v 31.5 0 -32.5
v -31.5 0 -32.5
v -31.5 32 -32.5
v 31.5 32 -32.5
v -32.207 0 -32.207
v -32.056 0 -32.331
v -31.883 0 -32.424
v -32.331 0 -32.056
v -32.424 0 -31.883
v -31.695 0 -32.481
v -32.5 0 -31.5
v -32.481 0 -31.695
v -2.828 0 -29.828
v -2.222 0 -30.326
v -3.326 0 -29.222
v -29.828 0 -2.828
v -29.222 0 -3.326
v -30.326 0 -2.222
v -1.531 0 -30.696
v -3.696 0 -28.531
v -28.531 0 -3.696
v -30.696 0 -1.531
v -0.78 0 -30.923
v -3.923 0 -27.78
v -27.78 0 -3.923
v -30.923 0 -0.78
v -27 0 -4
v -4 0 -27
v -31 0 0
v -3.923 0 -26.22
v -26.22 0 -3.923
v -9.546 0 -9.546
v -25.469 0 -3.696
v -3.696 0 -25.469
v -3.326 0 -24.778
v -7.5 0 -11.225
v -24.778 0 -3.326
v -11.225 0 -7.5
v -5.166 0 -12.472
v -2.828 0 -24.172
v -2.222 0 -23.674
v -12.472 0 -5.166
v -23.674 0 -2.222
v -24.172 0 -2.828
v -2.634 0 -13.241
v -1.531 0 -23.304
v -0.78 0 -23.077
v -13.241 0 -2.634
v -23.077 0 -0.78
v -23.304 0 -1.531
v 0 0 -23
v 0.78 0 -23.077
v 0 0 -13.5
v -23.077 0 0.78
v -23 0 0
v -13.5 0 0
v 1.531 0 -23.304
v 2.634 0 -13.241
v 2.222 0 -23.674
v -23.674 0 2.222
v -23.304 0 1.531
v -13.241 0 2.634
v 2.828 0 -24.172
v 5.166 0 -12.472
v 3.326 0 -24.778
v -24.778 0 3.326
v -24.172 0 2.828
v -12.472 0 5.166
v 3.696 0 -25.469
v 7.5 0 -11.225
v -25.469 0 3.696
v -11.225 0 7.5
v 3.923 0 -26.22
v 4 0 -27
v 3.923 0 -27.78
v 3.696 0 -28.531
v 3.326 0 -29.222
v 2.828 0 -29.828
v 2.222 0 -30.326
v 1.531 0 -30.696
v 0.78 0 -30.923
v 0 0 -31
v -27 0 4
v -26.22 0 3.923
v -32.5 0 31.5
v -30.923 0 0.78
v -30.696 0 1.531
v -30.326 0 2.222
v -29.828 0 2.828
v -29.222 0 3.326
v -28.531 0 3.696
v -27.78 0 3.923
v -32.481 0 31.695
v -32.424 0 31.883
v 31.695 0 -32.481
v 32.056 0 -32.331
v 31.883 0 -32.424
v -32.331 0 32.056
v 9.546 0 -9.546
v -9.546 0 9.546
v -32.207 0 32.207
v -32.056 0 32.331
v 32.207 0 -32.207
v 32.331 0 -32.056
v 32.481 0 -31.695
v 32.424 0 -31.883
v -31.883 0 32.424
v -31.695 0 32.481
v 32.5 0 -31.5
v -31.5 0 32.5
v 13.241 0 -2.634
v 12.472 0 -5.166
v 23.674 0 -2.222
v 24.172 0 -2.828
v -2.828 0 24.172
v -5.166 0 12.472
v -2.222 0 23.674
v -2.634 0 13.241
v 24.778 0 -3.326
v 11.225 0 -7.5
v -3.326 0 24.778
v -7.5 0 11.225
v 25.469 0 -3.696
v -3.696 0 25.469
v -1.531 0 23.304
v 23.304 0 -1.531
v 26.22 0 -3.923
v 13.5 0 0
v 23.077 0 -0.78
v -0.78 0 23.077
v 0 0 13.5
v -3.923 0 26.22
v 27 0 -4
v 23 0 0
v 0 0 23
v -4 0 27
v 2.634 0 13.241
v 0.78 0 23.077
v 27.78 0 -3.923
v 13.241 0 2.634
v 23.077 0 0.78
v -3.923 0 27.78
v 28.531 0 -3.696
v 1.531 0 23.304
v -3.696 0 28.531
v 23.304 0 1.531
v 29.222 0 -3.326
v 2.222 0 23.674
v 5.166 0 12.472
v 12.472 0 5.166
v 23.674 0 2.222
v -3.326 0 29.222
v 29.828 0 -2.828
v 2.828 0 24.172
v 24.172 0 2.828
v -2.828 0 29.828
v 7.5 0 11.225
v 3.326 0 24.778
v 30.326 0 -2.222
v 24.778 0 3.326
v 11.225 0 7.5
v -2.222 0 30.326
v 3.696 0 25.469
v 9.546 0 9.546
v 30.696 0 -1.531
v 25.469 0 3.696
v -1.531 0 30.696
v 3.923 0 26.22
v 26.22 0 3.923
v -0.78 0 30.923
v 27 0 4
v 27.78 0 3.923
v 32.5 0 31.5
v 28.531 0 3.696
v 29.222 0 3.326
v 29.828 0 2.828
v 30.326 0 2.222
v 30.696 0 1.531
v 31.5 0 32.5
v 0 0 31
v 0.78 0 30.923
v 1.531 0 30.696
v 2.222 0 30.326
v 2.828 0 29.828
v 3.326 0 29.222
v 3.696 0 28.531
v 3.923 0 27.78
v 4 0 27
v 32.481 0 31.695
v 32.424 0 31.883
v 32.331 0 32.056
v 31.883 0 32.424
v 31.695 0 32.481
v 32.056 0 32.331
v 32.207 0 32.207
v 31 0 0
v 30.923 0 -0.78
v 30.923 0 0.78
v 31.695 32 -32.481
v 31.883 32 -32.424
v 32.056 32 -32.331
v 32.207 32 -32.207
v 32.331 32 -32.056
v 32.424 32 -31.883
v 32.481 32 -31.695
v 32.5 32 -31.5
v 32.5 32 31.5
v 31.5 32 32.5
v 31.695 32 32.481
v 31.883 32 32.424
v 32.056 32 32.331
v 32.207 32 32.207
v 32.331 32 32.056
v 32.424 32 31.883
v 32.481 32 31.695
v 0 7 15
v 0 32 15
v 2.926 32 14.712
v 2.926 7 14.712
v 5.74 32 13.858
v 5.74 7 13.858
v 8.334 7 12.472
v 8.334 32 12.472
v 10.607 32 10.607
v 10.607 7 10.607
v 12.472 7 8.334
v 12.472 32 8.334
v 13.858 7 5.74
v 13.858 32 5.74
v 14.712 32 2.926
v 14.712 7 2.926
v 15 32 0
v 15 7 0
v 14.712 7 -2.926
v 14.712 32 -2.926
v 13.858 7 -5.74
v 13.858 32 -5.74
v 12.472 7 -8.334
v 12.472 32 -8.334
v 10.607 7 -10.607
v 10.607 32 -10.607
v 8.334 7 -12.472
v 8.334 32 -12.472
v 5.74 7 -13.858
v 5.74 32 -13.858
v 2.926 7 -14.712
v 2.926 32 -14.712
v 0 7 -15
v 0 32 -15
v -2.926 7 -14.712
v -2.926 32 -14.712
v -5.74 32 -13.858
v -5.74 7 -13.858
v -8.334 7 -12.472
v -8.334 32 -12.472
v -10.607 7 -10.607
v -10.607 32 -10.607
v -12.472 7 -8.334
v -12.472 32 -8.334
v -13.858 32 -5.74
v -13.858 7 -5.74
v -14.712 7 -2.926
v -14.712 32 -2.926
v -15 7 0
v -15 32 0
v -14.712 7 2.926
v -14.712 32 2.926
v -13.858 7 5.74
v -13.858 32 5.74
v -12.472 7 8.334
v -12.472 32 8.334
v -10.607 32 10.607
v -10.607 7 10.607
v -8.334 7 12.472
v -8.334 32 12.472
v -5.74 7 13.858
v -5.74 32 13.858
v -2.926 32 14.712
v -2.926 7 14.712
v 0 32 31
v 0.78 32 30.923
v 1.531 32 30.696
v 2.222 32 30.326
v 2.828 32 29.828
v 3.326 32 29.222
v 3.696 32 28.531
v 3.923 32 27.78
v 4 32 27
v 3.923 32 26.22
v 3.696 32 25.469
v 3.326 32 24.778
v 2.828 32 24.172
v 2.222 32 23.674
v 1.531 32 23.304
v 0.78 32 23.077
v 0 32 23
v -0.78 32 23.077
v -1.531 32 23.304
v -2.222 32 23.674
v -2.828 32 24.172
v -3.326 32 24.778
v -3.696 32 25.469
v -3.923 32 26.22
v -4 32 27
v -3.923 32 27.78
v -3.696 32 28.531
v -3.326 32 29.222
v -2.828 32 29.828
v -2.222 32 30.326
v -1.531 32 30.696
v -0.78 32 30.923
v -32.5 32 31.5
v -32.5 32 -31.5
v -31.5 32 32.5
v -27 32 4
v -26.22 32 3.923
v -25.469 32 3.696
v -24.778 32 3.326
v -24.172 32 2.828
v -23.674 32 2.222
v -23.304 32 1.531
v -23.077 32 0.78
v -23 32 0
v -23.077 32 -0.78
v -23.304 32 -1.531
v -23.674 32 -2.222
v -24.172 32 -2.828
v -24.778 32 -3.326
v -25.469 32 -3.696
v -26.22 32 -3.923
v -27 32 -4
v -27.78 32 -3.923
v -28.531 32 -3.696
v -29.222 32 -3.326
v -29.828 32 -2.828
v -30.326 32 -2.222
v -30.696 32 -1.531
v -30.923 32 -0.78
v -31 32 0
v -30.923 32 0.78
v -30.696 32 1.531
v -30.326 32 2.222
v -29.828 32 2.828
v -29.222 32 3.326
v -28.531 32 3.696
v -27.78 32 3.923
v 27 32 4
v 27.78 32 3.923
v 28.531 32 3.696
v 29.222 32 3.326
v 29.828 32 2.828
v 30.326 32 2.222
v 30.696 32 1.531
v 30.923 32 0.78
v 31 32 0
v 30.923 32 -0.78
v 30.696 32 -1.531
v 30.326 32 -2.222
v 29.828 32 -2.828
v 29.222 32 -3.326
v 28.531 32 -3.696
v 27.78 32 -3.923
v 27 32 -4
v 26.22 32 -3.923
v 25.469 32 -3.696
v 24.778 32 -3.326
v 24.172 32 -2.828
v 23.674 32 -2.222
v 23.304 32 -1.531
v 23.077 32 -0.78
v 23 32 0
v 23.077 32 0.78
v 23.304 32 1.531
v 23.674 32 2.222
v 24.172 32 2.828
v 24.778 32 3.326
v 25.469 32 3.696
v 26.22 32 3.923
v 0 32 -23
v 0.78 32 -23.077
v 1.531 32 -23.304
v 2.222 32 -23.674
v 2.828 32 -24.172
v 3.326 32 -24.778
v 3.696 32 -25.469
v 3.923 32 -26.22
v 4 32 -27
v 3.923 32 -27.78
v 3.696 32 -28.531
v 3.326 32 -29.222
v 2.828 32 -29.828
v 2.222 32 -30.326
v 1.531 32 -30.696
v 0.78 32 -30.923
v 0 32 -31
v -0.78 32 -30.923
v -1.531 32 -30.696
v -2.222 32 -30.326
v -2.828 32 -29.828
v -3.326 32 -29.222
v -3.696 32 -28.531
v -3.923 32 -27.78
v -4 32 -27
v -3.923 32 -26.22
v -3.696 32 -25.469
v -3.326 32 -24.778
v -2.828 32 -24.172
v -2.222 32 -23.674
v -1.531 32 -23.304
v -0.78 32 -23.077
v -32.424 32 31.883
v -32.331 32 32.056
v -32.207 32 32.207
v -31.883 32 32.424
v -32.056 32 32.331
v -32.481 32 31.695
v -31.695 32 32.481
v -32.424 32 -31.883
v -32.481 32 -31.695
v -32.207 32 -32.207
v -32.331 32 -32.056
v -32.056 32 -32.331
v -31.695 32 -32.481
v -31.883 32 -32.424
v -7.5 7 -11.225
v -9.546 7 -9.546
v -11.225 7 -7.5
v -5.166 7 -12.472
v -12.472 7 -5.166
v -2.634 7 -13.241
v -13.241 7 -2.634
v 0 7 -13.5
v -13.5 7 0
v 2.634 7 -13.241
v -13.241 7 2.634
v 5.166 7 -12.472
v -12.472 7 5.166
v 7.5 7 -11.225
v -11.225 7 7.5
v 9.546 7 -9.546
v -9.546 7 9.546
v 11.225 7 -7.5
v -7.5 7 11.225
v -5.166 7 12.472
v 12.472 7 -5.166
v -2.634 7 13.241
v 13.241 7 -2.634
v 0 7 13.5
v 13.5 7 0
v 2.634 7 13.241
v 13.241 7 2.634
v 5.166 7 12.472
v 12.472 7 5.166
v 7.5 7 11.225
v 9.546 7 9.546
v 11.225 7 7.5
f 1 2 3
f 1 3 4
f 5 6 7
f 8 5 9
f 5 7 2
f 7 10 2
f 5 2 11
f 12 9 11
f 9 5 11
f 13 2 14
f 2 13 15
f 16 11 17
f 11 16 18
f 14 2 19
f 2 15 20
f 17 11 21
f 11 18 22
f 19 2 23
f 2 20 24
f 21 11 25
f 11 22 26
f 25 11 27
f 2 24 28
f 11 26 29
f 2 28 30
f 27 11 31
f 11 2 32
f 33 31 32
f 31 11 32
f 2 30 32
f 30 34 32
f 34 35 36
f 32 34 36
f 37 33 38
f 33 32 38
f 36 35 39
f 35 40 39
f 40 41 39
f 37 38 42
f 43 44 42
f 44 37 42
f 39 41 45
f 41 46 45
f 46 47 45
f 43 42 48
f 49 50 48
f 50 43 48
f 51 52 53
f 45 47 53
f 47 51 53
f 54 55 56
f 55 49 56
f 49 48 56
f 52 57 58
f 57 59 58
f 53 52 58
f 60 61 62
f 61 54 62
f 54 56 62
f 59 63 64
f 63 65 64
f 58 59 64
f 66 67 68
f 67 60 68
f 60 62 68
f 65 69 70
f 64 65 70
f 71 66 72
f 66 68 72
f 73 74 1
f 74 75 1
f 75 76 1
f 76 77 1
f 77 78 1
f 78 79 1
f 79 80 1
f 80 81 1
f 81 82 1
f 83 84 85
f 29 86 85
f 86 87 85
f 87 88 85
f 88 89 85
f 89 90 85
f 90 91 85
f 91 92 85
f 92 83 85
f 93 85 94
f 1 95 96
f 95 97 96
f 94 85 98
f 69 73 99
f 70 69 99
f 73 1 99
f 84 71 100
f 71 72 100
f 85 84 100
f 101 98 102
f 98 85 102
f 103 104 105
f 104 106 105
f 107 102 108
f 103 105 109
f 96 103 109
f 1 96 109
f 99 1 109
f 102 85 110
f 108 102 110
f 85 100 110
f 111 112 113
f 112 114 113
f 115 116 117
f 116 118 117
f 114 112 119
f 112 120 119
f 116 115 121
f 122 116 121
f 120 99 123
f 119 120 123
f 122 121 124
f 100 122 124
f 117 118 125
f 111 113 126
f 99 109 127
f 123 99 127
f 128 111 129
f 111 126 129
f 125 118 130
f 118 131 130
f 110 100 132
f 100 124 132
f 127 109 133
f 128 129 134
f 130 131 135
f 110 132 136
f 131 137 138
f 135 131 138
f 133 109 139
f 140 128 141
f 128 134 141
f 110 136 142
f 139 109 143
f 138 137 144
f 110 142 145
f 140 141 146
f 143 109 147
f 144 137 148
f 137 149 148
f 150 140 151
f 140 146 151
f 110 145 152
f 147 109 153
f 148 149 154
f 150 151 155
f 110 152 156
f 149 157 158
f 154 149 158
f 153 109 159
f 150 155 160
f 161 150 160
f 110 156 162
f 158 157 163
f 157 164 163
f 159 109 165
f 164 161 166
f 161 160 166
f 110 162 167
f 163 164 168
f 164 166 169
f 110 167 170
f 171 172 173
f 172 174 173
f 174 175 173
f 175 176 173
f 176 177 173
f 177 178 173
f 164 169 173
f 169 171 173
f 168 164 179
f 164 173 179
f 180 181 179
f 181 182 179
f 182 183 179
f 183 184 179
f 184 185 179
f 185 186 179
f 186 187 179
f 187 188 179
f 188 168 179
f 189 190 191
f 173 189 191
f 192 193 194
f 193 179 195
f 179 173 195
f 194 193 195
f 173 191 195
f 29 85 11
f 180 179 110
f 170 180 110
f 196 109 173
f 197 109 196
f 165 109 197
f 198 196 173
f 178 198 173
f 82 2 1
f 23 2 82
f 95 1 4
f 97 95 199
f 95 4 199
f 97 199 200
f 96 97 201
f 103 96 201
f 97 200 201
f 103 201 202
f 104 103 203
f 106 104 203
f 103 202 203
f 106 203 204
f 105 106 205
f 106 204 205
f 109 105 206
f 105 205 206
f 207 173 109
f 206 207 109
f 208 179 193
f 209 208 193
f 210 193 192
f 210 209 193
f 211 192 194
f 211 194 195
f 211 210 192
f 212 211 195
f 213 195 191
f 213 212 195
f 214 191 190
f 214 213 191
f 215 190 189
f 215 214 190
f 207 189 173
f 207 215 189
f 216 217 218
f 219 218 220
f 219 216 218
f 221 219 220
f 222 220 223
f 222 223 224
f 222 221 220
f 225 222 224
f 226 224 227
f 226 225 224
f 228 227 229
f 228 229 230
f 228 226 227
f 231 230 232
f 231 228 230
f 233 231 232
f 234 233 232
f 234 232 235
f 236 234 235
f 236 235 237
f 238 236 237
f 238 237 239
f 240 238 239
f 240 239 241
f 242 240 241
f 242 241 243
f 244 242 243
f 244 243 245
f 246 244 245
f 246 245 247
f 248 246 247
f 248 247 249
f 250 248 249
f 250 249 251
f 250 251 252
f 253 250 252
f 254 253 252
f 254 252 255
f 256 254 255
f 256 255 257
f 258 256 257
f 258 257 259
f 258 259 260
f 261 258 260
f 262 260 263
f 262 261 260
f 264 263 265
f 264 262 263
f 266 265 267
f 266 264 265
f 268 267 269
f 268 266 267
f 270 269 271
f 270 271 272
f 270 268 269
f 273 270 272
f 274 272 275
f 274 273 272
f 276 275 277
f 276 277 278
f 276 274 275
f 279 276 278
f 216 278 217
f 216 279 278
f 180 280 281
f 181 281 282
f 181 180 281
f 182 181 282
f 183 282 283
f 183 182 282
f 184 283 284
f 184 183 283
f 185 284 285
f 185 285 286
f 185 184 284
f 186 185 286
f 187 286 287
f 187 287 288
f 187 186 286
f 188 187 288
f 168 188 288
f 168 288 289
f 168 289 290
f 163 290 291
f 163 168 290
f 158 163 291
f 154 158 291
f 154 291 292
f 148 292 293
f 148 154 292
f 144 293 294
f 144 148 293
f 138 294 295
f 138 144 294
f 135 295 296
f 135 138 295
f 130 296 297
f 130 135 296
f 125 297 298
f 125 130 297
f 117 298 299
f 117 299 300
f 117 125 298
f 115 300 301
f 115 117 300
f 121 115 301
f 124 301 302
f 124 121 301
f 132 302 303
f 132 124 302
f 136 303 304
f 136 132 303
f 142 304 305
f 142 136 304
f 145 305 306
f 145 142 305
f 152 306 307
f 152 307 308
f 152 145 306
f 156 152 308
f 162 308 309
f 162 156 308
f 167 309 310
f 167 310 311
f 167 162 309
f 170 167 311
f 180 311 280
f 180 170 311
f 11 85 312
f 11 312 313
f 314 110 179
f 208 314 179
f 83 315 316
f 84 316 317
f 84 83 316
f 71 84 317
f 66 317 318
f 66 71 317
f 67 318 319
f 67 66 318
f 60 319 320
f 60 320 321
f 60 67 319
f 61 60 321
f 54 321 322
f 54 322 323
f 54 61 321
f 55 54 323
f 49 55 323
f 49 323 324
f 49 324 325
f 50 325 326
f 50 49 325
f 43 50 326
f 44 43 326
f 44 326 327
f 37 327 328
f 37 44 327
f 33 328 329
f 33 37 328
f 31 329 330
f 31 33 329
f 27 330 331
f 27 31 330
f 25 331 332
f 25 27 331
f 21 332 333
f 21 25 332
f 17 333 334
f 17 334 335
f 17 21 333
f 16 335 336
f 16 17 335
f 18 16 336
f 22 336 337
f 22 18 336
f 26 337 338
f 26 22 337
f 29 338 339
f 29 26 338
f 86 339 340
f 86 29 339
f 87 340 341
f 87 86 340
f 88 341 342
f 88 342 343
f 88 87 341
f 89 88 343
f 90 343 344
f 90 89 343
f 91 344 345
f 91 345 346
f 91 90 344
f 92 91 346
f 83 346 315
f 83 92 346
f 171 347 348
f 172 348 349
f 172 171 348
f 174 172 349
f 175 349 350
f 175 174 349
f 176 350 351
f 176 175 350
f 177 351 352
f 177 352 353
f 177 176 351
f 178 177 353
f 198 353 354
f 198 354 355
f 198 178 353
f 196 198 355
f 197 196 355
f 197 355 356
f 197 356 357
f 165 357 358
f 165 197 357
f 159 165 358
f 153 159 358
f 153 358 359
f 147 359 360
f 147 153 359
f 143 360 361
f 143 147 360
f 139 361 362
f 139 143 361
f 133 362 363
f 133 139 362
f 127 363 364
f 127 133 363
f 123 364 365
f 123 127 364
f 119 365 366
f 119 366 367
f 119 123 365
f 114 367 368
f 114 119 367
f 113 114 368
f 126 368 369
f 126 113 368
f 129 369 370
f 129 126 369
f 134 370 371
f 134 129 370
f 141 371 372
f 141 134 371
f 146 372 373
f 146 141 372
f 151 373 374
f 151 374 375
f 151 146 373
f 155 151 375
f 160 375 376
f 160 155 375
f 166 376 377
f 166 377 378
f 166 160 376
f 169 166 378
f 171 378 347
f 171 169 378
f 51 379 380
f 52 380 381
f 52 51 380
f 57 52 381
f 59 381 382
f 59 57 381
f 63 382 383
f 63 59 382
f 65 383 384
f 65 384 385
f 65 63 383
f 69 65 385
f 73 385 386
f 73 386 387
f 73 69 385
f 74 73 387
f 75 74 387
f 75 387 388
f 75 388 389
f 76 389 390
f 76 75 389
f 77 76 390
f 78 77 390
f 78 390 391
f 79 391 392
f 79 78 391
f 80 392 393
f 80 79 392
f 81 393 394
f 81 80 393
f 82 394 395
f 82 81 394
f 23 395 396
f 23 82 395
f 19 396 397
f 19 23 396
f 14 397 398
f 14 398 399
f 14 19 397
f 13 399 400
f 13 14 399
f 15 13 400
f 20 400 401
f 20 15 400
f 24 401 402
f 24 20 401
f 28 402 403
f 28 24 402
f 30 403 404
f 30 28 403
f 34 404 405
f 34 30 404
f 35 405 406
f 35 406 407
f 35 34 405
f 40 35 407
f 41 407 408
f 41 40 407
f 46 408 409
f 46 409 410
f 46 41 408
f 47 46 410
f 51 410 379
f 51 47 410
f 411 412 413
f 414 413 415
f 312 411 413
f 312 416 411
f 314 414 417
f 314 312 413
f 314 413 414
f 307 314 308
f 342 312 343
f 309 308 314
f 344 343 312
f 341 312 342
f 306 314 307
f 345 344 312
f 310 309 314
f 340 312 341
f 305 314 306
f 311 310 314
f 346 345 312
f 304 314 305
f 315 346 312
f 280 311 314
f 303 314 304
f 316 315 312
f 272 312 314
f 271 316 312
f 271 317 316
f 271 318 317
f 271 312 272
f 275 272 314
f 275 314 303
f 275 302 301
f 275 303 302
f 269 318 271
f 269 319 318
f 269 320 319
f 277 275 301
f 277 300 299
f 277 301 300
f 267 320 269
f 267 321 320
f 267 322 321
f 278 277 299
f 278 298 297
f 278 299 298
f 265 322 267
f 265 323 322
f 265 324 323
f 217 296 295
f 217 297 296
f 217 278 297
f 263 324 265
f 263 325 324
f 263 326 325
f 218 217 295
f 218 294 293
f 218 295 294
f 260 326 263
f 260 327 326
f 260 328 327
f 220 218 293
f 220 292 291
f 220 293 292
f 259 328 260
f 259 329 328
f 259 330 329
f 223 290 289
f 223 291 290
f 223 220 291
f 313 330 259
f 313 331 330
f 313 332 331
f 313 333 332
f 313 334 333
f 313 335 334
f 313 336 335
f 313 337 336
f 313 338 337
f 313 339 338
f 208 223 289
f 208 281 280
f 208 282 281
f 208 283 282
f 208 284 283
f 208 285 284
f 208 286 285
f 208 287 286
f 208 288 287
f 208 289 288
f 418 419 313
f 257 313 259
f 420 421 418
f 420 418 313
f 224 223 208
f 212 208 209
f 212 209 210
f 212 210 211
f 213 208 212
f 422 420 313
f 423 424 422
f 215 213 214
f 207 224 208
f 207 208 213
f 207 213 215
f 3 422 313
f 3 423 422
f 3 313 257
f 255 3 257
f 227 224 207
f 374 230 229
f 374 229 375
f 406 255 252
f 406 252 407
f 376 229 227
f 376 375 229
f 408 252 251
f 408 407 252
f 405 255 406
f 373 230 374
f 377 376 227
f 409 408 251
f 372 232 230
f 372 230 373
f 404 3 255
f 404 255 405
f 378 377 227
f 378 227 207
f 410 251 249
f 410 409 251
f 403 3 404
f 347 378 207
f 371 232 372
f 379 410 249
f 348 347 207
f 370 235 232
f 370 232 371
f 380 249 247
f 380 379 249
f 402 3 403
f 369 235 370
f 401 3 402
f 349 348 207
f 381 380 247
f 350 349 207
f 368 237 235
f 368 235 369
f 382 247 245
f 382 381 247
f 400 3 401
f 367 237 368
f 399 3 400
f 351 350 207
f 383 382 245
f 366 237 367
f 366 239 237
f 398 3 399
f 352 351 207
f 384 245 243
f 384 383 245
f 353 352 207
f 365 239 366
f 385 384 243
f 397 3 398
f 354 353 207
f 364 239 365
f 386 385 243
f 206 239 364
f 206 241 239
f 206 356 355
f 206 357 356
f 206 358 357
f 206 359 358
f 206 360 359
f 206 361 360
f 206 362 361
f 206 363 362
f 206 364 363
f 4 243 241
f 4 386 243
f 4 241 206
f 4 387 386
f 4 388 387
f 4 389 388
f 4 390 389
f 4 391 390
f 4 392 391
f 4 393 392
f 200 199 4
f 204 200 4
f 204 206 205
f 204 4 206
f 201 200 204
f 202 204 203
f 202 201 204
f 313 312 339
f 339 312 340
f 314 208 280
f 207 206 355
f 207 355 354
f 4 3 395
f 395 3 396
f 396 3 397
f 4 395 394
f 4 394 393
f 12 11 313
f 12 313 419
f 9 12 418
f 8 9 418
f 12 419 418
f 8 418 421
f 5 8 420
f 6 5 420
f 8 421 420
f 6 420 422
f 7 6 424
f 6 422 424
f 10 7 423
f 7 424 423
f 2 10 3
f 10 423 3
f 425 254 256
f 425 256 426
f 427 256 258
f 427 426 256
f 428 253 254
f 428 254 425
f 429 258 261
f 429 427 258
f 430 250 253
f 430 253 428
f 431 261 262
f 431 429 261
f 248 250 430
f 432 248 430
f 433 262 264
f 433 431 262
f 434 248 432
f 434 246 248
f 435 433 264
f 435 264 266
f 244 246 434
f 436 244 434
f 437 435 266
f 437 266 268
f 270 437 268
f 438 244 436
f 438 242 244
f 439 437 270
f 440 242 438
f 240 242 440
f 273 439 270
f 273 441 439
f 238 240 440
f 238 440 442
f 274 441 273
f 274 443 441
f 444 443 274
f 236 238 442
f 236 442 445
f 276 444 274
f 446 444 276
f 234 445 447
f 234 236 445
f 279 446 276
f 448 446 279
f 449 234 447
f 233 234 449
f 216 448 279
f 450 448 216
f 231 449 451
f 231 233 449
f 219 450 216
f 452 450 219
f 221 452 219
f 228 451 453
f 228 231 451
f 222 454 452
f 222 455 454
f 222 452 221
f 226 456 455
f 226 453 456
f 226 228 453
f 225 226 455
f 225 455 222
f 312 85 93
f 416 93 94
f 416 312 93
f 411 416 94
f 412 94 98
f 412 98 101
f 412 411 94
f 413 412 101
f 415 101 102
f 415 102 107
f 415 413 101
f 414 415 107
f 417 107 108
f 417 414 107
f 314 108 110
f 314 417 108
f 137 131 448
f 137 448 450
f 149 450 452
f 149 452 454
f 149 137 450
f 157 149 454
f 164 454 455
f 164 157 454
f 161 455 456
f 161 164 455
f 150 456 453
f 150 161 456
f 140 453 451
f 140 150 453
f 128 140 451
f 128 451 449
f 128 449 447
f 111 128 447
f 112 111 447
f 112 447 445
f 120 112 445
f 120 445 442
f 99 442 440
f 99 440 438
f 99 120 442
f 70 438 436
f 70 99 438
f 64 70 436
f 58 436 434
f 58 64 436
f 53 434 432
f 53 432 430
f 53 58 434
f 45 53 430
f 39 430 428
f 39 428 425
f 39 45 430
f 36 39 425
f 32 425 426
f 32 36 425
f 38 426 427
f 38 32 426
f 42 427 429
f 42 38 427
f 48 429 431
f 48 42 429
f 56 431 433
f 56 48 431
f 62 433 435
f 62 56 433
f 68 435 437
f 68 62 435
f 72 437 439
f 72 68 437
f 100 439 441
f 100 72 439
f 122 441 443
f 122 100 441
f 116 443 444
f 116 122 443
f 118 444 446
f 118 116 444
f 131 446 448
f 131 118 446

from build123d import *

# Parameters (mm, degrees)
CROQUIS2_W              = 65
CROQUIS2_H              = 65
CROQUIS2_R              = 15
CROQUIS2_R_2            = 4
SALIENTE_EXTRUIR1_DEPTH = 32
CROQUIS3_R              = 15
CROQUIS3_R_2            = 13.5
SALIENTE_EXTRUIR2_DEPTH = 7
REDONDEO1_R             = 1


with BuildPart() as part:
    # Croquis2 → Saliente-Extruir1 (new body)
    with BuildSketch(Plane(origin=(0, 0, 0), x_dir=(1, 0, 0), z_dir=(0, 1, 0))):
        Rectangle(CROQUIS2_W, CROQUIS2_H)
        with Locations(Location((0, 0, 0), (0, 0, 270))):
            Circle(CROQUIS2_R, mode=Mode.SUBTRACT)
        with Locations(Location((-27, 0, 0), (0, 0, 270))):
            Circle(CROQUIS2_R_2, mode=Mode.SUBTRACT)
        with Locations(Location((27, 0, 0), (0, 0, 270))):
            Circle(CROQUIS2_R_2, mode=Mode.SUBTRACT)
        with Locations(Location((0, 27, 0), (0, 0, 270))):
            Circle(CROQUIS2_R_2, mode=Mode.SUBTRACT)
        with Locations(Location((0, -27, 0), (0, 0, 270))):
            Circle(CROQUIS2_R_2, mode=Mode.SUBTRACT)
    extrude(amount=SALIENTE_EXTRUIR1_DEPTH)

    # Croquis3 → Saliente-Extruir2 (add)
    with BuildSketch(Plane(origin=(0, 0, 0), x_dir=(1, 0, 0), z_dir=(0, 1, 0))):
        with Locations(Location((0, 0, 0), (0, 0, 270))):
            Circle(CROQUIS3_R)
        with Locations(Location((0, 0, 0), (0, 0, 270))):
            Circle(CROQUIS3_R_2, mode=Mode.SUBTRACT)
    extrude(amount=SALIENTE_EXTRUIR2_DEPTH)

    # Redondeo1
    redondeo1_edges = [part.edges().sort_by_distance(p)[0] for p in [
        (-32.5, 16, -32.5),
        (32.5, 16, -32.5),
        (32.5, 16, 32.5),
        (-32.5, 16, 32.5),
    ]]
    fillet(redondeo1_edges, radius=REDONDEO1_R)


solid = part.part
